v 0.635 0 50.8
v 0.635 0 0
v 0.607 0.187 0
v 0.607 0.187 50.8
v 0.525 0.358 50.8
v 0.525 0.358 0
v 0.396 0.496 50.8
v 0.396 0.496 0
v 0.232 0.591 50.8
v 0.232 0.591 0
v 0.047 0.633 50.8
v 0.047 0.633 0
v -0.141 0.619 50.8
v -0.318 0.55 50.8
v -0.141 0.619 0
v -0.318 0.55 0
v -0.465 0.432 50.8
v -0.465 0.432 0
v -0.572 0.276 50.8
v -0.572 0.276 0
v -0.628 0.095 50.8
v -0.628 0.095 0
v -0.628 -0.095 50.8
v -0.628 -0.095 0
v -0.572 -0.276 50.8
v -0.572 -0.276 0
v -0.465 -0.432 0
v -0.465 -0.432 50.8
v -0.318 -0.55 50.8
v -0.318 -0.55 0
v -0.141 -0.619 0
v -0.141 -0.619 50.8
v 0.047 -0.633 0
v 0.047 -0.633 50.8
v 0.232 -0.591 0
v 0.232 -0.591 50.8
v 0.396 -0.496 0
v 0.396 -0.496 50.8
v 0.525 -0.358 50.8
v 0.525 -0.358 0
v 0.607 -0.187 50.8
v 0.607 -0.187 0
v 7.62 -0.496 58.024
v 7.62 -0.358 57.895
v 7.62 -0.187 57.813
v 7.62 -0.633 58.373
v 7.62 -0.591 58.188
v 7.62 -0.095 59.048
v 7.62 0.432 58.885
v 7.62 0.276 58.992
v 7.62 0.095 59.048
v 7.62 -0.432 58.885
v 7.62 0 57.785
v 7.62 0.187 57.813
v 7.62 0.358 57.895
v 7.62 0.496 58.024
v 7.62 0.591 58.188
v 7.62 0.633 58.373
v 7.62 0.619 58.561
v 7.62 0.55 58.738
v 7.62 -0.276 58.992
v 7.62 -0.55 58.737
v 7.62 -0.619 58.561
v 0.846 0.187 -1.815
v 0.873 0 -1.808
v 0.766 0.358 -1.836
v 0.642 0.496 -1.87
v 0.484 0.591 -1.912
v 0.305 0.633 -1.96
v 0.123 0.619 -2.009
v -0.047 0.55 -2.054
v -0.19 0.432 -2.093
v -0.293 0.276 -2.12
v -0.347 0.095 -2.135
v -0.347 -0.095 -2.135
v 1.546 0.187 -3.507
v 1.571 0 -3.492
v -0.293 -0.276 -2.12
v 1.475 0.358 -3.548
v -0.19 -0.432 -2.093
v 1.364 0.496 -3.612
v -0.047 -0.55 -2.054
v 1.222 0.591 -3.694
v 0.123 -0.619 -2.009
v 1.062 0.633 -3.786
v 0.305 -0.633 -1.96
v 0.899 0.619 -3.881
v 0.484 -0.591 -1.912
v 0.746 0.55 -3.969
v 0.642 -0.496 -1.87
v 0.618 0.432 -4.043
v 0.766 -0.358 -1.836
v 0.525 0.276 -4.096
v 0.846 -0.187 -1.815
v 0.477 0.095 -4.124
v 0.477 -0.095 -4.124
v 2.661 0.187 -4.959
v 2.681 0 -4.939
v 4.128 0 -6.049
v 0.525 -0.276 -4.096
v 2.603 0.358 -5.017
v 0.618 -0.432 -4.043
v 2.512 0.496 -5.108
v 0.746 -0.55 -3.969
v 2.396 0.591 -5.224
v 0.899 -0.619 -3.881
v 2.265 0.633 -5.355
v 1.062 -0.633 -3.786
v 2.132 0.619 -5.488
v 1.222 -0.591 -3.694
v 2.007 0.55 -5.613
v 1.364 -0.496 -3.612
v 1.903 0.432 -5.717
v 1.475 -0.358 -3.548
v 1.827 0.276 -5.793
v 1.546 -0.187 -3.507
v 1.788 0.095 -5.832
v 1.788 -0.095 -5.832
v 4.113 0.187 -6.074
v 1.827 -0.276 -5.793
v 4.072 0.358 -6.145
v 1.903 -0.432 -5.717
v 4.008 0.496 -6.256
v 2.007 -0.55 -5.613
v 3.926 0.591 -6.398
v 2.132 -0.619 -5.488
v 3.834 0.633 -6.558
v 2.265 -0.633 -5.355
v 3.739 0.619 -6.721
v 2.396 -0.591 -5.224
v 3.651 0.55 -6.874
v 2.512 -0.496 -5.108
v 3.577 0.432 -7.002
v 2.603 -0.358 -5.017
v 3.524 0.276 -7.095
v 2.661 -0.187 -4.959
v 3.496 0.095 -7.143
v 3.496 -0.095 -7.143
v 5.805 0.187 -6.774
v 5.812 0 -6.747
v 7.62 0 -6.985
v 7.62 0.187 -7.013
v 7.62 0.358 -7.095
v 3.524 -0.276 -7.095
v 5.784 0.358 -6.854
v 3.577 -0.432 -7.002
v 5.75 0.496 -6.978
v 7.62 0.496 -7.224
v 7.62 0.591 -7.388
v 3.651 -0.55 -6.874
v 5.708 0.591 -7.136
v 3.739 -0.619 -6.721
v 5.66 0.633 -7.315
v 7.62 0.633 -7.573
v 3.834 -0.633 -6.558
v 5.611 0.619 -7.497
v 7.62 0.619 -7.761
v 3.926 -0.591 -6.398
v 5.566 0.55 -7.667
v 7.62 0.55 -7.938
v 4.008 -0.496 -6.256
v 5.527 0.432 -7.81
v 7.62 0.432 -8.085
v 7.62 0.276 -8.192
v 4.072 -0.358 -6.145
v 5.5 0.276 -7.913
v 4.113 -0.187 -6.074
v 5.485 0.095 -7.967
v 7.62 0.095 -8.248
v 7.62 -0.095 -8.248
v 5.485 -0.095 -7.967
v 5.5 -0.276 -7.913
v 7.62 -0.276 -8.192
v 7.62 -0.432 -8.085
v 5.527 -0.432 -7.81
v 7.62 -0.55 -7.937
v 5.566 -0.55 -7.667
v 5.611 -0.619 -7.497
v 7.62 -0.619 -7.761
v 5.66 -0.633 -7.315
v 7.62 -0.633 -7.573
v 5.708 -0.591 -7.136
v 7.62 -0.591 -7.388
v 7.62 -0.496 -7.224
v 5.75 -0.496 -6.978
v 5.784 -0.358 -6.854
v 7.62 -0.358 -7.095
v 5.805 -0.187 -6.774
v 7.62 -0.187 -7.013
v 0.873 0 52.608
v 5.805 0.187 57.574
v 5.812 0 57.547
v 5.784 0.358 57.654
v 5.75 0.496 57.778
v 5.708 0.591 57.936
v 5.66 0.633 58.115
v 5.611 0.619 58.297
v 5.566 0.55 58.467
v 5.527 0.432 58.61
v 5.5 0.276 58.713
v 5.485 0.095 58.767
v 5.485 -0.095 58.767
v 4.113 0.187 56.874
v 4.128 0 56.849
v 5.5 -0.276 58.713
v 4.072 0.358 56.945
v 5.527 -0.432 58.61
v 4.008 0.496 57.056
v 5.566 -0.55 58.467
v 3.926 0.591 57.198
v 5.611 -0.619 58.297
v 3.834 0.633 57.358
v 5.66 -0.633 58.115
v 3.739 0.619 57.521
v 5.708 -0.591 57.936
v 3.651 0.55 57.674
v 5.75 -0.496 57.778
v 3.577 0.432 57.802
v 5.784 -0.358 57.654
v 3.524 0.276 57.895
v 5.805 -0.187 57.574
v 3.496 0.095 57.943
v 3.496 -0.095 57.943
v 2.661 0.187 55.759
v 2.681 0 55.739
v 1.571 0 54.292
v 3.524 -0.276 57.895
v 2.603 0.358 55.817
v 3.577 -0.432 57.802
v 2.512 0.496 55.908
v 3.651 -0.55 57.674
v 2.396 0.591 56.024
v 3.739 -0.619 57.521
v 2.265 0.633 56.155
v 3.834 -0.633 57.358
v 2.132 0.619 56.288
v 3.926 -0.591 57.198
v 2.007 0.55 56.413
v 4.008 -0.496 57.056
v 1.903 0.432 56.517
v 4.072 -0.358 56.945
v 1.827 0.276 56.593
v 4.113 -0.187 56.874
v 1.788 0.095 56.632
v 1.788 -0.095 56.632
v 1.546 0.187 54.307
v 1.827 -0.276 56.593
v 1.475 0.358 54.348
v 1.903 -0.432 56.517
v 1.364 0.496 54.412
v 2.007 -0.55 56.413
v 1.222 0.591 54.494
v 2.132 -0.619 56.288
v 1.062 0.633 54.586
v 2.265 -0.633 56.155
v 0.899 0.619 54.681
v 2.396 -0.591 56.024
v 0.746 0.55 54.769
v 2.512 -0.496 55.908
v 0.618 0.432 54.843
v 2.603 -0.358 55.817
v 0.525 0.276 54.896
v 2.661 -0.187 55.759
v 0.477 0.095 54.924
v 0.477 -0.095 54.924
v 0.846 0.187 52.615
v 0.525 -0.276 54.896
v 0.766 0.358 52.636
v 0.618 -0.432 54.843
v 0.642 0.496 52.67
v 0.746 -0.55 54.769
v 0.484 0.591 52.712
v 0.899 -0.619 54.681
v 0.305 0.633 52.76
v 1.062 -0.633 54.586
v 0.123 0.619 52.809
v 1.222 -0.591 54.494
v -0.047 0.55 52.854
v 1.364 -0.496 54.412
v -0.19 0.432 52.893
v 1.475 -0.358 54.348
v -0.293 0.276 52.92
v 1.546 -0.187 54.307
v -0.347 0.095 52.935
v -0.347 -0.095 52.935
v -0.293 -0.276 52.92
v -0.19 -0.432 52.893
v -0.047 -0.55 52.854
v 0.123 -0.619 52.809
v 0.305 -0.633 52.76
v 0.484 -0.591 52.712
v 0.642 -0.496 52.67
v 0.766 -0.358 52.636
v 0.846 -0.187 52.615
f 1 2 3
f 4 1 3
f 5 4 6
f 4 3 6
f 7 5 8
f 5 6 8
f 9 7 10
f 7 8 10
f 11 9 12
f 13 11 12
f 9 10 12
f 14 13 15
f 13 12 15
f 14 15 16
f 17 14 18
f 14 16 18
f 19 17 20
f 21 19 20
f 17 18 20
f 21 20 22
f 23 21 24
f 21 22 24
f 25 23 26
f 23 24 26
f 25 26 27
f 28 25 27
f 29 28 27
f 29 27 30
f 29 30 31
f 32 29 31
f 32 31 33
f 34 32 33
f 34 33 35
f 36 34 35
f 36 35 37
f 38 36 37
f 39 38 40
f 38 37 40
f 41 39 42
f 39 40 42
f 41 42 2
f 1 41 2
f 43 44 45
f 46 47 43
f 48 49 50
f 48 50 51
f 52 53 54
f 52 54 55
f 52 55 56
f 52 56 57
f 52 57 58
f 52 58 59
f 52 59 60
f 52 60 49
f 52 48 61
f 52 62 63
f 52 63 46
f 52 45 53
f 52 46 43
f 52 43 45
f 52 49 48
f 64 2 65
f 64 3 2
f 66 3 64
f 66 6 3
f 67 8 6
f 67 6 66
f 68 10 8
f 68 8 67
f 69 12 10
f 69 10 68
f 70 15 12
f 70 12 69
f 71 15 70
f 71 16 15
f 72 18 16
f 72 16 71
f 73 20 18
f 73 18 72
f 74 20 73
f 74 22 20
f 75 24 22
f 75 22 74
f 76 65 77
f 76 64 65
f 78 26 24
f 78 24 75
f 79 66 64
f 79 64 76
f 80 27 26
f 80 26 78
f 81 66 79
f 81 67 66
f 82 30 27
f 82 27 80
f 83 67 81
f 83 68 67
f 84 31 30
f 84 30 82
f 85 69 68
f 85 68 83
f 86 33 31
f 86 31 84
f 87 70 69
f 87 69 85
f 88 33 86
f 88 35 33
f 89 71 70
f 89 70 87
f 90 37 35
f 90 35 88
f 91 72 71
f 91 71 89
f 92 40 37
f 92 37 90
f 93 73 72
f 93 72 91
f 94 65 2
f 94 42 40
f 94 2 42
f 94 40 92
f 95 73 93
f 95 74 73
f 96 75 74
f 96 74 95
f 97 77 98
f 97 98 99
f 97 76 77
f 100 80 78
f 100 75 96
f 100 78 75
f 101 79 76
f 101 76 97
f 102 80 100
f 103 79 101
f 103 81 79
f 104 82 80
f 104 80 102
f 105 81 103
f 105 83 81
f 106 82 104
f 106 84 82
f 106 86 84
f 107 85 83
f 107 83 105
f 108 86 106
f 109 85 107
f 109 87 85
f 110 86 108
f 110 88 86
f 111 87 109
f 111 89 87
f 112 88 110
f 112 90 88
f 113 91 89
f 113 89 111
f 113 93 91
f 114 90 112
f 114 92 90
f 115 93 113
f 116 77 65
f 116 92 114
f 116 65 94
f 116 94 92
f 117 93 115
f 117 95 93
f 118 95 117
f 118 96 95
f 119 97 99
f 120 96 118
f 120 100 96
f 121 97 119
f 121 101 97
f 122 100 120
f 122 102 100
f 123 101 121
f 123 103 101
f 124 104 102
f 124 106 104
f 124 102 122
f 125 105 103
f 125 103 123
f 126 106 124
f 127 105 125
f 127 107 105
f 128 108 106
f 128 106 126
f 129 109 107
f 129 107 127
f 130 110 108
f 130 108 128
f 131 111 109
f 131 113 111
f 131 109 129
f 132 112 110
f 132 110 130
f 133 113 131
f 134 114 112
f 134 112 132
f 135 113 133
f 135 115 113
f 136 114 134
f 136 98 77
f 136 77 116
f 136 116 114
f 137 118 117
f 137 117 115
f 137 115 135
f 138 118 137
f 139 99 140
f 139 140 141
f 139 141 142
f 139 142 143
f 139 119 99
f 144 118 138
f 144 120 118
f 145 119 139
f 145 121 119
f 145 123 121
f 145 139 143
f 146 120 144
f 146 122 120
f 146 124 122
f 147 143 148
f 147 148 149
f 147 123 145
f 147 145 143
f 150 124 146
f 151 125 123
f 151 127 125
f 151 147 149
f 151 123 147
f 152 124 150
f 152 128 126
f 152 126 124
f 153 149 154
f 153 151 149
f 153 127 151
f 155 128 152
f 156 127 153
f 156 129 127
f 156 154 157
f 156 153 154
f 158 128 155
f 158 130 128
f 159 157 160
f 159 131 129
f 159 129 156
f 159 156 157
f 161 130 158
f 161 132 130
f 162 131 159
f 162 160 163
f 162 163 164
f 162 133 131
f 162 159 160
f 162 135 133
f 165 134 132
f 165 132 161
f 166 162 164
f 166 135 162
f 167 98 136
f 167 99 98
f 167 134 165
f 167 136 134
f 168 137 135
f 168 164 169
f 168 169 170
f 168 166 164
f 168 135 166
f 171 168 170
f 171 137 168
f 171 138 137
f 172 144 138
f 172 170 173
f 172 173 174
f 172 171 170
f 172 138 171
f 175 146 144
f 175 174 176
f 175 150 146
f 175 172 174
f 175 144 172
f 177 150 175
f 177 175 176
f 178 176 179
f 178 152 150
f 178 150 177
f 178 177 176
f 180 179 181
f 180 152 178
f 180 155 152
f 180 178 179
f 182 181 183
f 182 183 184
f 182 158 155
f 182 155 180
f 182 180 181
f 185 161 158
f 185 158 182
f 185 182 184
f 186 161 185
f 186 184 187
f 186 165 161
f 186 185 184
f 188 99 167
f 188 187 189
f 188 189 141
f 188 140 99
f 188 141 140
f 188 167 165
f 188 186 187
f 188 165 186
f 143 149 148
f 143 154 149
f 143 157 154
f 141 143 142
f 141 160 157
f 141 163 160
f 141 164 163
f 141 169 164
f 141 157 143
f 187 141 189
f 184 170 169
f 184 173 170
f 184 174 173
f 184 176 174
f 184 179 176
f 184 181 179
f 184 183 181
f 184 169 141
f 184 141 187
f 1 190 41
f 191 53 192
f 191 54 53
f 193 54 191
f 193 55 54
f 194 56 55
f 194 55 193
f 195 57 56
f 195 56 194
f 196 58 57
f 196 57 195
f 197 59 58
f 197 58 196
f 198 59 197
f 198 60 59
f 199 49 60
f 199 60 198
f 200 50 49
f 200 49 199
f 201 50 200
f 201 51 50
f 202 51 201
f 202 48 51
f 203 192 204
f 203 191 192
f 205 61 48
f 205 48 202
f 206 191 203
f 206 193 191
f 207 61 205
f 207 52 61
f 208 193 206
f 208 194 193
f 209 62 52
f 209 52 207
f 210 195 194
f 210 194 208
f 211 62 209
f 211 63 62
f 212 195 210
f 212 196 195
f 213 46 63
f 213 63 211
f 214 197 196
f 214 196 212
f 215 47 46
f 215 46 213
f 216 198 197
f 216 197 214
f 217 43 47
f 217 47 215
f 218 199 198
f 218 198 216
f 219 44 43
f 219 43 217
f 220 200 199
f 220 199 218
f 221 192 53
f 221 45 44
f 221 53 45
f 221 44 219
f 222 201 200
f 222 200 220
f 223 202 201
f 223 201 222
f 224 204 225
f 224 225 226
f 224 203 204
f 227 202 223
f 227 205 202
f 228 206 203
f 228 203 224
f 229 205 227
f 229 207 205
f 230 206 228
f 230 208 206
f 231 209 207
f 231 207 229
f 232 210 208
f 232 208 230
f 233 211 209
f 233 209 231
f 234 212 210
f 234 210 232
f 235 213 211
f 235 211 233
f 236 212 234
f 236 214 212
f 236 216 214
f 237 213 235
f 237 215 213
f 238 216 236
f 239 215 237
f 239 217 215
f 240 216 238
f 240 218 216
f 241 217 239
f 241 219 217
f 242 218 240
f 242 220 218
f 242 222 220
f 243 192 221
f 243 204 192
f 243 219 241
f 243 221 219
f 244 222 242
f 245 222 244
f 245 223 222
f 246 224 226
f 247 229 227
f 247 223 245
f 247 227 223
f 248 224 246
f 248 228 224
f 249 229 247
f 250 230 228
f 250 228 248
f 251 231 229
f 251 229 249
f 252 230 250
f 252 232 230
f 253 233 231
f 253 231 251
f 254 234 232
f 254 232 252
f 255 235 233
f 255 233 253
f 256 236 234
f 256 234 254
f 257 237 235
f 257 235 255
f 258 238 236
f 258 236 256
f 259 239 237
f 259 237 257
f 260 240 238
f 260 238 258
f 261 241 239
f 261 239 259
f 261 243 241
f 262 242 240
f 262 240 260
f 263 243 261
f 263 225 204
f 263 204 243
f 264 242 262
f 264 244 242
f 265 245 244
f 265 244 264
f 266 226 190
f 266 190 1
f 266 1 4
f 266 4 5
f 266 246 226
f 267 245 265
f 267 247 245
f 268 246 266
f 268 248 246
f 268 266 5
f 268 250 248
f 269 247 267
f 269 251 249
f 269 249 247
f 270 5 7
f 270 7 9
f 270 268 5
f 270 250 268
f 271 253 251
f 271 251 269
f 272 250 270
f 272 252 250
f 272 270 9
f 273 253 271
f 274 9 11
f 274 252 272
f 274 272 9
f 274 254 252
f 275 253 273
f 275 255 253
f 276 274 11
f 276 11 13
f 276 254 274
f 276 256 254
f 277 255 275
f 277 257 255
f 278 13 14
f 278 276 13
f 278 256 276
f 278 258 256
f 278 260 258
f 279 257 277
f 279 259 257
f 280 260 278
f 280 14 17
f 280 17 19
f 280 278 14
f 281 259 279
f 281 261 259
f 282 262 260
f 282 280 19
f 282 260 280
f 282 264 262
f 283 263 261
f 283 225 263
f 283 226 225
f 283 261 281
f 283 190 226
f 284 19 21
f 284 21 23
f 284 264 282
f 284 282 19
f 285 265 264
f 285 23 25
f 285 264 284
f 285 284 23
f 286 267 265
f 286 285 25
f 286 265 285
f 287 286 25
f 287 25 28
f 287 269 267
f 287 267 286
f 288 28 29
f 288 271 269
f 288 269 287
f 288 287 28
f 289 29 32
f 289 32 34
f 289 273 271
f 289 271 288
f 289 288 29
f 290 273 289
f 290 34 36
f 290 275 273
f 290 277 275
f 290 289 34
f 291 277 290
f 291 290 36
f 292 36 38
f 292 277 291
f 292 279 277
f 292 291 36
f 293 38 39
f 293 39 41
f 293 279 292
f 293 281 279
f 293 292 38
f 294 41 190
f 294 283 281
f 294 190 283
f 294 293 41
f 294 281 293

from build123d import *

# Parameters (mm, degrees)
F0_R       = 0.635
F1_DEPTH   = 50.8
F1_FACE_R  = 0.635
F1_FACE1_R = 0.635


with BuildPart() as f1:
    # F0 (on Top) → F1 (new body)
    with BuildSketch(Plane.XY):
        Circle(F0_R)
    extrude(amount=F1_DEPTH)

    # F3: sweep along a path in F2
    with BuildLine(Plane.XZ) as f3_path:
        ThreePointArc((7.62, 58.42), (2.2318463274, 56.1881536726), (0, 50.8))
    # F1_face (on face) → F3 (sweep)
    with BuildSketch(Plane.XY.offset(50.8)):
        Circle(F1_FACE_R)
    sweep(path=f3_path.line)

    # F5: sweep along a path in F4
    with BuildLine(Plane.XZ) as f5_path:
        ThreePointArc((0, 0), (2.2318463274, -5.3881536726), (7.62, -7.62))
    # F1_face1 (on face) → F5 (sweep)
    with BuildSketch(Plane(origin=(0, 0, 0), x_dir=(1, 0, 0), z_dir=(0, 0, -1))):
        Circle(F1_FACE1_R)
    sweep(path=f5_path.line)


solid = f1.part
